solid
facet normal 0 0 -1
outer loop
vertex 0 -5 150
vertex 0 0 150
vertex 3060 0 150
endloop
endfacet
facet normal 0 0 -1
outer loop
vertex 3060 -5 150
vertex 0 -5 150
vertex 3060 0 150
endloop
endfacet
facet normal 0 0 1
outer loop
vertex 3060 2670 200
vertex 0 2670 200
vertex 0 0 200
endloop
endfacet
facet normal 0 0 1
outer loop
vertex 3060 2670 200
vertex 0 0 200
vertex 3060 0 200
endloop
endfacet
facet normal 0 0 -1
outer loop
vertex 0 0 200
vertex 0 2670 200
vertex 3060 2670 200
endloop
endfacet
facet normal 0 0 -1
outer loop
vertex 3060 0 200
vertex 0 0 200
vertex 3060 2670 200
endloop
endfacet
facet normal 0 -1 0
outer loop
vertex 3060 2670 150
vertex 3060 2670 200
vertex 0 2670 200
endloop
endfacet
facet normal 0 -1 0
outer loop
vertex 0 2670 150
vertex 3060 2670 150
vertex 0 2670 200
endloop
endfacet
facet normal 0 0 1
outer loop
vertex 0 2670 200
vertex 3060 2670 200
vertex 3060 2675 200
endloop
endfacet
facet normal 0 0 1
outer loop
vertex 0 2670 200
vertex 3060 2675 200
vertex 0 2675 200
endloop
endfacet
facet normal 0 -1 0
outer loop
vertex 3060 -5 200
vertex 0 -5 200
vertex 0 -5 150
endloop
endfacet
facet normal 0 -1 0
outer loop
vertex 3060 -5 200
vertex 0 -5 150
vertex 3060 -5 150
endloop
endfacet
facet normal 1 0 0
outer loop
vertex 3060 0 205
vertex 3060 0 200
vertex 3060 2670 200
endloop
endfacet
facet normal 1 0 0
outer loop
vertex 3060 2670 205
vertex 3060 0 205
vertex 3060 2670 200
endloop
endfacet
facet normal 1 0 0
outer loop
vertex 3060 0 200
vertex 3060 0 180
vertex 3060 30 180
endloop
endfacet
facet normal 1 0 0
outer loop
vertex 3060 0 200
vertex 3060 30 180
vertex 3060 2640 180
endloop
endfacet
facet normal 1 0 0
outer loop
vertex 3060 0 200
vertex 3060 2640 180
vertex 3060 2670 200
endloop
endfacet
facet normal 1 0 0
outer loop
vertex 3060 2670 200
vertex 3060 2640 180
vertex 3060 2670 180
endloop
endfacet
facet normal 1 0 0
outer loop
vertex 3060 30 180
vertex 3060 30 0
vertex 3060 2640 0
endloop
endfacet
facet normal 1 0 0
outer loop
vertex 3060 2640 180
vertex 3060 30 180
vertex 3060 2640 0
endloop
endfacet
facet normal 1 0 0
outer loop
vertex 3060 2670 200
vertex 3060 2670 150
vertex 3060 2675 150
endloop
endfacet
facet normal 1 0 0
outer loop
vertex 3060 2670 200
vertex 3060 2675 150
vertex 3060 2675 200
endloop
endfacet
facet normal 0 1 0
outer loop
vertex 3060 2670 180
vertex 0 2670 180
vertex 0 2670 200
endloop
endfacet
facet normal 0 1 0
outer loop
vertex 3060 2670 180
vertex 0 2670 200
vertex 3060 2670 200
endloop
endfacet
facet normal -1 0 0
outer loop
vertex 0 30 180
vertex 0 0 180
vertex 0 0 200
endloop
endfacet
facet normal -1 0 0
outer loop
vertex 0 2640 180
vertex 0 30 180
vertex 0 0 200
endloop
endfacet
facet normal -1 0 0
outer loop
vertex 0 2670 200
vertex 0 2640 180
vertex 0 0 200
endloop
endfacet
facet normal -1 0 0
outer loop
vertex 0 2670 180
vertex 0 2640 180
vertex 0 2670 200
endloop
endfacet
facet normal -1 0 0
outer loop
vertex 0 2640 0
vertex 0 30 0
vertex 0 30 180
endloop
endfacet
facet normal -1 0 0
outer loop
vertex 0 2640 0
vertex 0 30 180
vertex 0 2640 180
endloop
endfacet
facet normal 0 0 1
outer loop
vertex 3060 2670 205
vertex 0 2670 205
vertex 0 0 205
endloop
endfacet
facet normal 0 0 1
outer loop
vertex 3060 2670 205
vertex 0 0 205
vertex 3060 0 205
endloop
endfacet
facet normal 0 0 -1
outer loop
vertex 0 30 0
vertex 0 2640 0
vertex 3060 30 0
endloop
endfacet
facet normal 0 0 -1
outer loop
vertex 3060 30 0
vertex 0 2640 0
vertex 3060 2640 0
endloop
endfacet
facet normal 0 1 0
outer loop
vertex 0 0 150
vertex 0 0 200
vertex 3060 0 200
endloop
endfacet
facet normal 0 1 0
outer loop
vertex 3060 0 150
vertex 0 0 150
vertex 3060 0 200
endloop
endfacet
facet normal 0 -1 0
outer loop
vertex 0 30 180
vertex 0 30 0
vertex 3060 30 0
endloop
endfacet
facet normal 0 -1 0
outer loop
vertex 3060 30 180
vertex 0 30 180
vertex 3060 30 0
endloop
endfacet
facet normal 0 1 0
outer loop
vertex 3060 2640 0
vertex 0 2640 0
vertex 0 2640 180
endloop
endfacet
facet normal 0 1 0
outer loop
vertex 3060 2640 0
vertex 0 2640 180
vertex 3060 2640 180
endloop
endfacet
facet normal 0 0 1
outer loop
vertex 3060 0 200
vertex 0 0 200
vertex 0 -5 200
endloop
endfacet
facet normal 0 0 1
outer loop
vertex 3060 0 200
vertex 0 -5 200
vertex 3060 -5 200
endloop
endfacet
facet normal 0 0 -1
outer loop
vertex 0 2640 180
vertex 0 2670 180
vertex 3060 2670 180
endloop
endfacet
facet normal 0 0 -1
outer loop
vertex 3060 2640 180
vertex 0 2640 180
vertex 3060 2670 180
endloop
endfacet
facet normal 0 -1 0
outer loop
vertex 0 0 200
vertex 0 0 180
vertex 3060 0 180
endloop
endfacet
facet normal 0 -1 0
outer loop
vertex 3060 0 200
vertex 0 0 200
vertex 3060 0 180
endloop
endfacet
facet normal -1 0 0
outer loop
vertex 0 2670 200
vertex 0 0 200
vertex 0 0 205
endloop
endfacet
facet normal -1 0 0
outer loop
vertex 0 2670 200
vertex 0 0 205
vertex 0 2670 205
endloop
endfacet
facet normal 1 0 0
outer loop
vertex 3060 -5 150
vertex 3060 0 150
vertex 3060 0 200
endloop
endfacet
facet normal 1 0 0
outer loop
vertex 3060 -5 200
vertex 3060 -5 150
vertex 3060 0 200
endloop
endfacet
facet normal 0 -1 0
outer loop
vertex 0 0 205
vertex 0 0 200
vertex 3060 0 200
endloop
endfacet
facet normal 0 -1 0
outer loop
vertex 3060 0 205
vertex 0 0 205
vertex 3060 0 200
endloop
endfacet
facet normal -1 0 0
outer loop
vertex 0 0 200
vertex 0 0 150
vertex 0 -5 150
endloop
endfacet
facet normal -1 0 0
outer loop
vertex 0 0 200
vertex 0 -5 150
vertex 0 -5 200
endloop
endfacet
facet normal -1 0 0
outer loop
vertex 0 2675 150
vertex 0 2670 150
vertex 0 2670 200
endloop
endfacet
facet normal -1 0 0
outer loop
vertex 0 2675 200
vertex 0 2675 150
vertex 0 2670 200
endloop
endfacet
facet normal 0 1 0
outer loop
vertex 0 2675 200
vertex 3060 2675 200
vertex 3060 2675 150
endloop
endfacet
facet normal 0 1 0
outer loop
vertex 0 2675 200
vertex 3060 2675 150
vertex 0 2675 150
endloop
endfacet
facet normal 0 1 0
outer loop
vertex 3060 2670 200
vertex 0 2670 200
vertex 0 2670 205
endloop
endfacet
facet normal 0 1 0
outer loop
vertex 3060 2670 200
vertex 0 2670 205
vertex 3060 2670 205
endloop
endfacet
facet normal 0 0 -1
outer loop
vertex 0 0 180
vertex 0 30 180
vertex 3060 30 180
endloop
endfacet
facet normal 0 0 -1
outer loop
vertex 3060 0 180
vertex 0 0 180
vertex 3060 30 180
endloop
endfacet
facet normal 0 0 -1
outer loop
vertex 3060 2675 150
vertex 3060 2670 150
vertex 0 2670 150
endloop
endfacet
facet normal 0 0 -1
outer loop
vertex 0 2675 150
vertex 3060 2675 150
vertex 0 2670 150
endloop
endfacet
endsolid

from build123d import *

# Parameters (mm, degrees)
F0_W      = 3060
F0_H      = 2670
F1_DEPTH  = 200
F3_W      = 3060
F3_H      = 2670
F4_DEPTH  = 5
F6_W      = 3060
F6_H      = 30
F6_W_2    = 3069.5407390594
F7_DEPTH  = 180
F8_W      = 3060
F8_H      = 50
F9_DEPTH  = 5
F10_W     = 3060
F10_H     = 50
F11_DEPTH = 5


with BuildPart() as f1:
    # F0 (on Top) → F1 (new body)
    with BuildSketch(Plane.XY):
        with Locations((1530, 1335)):
            Rectangle(F0_W, F0_H)
    extrude(amount=F1_DEPTH)

    # F6 (on Top) → F7 (cut, through all)
    with BuildSketch(Plane.XY):
        with Locations((1530, 2655)):
            Rectangle(F6_W, F6_H)
        with Locations((1534.7703695297, 15)):
            Rectangle(F6_W_2, F6_H)
    extrude(amount=F7_DEPTH, mode=Mode.SUBTRACT)


with BuildPart() as f4:
    # F3 (on face) → F4 (new body)
    with BuildSketch(Plane.XY.offset(200)):
        with Locations((1530, 1335)):
            Rectangle(F3_W, F3_H)
    extrude(amount=F4_DEPTH)


with BuildPart() as f9:
    # F8 (on face) → F9 (new body)
    with BuildSketch(Plane(origin=(0, 2670, 0), x_dir=(-1, 0, 0), z_dir=(0, 1, 0))):
        with Locations((-1530, 175)):
            Rectangle(F8_W, F8_H)
    extrude(amount=F9_DEPTH)


with BuildPart() as f11:
    # F10 (on face) → F11 (new body)
    with BuildSketch(Plane.XZ):
        with Locations((1530, 175)):
            Rectangle(F10_W, F10_H)
    extrude(amount=F11_DEPTH)


solid = Compound([f1.part, f4.part, f9.part, f11.part])
